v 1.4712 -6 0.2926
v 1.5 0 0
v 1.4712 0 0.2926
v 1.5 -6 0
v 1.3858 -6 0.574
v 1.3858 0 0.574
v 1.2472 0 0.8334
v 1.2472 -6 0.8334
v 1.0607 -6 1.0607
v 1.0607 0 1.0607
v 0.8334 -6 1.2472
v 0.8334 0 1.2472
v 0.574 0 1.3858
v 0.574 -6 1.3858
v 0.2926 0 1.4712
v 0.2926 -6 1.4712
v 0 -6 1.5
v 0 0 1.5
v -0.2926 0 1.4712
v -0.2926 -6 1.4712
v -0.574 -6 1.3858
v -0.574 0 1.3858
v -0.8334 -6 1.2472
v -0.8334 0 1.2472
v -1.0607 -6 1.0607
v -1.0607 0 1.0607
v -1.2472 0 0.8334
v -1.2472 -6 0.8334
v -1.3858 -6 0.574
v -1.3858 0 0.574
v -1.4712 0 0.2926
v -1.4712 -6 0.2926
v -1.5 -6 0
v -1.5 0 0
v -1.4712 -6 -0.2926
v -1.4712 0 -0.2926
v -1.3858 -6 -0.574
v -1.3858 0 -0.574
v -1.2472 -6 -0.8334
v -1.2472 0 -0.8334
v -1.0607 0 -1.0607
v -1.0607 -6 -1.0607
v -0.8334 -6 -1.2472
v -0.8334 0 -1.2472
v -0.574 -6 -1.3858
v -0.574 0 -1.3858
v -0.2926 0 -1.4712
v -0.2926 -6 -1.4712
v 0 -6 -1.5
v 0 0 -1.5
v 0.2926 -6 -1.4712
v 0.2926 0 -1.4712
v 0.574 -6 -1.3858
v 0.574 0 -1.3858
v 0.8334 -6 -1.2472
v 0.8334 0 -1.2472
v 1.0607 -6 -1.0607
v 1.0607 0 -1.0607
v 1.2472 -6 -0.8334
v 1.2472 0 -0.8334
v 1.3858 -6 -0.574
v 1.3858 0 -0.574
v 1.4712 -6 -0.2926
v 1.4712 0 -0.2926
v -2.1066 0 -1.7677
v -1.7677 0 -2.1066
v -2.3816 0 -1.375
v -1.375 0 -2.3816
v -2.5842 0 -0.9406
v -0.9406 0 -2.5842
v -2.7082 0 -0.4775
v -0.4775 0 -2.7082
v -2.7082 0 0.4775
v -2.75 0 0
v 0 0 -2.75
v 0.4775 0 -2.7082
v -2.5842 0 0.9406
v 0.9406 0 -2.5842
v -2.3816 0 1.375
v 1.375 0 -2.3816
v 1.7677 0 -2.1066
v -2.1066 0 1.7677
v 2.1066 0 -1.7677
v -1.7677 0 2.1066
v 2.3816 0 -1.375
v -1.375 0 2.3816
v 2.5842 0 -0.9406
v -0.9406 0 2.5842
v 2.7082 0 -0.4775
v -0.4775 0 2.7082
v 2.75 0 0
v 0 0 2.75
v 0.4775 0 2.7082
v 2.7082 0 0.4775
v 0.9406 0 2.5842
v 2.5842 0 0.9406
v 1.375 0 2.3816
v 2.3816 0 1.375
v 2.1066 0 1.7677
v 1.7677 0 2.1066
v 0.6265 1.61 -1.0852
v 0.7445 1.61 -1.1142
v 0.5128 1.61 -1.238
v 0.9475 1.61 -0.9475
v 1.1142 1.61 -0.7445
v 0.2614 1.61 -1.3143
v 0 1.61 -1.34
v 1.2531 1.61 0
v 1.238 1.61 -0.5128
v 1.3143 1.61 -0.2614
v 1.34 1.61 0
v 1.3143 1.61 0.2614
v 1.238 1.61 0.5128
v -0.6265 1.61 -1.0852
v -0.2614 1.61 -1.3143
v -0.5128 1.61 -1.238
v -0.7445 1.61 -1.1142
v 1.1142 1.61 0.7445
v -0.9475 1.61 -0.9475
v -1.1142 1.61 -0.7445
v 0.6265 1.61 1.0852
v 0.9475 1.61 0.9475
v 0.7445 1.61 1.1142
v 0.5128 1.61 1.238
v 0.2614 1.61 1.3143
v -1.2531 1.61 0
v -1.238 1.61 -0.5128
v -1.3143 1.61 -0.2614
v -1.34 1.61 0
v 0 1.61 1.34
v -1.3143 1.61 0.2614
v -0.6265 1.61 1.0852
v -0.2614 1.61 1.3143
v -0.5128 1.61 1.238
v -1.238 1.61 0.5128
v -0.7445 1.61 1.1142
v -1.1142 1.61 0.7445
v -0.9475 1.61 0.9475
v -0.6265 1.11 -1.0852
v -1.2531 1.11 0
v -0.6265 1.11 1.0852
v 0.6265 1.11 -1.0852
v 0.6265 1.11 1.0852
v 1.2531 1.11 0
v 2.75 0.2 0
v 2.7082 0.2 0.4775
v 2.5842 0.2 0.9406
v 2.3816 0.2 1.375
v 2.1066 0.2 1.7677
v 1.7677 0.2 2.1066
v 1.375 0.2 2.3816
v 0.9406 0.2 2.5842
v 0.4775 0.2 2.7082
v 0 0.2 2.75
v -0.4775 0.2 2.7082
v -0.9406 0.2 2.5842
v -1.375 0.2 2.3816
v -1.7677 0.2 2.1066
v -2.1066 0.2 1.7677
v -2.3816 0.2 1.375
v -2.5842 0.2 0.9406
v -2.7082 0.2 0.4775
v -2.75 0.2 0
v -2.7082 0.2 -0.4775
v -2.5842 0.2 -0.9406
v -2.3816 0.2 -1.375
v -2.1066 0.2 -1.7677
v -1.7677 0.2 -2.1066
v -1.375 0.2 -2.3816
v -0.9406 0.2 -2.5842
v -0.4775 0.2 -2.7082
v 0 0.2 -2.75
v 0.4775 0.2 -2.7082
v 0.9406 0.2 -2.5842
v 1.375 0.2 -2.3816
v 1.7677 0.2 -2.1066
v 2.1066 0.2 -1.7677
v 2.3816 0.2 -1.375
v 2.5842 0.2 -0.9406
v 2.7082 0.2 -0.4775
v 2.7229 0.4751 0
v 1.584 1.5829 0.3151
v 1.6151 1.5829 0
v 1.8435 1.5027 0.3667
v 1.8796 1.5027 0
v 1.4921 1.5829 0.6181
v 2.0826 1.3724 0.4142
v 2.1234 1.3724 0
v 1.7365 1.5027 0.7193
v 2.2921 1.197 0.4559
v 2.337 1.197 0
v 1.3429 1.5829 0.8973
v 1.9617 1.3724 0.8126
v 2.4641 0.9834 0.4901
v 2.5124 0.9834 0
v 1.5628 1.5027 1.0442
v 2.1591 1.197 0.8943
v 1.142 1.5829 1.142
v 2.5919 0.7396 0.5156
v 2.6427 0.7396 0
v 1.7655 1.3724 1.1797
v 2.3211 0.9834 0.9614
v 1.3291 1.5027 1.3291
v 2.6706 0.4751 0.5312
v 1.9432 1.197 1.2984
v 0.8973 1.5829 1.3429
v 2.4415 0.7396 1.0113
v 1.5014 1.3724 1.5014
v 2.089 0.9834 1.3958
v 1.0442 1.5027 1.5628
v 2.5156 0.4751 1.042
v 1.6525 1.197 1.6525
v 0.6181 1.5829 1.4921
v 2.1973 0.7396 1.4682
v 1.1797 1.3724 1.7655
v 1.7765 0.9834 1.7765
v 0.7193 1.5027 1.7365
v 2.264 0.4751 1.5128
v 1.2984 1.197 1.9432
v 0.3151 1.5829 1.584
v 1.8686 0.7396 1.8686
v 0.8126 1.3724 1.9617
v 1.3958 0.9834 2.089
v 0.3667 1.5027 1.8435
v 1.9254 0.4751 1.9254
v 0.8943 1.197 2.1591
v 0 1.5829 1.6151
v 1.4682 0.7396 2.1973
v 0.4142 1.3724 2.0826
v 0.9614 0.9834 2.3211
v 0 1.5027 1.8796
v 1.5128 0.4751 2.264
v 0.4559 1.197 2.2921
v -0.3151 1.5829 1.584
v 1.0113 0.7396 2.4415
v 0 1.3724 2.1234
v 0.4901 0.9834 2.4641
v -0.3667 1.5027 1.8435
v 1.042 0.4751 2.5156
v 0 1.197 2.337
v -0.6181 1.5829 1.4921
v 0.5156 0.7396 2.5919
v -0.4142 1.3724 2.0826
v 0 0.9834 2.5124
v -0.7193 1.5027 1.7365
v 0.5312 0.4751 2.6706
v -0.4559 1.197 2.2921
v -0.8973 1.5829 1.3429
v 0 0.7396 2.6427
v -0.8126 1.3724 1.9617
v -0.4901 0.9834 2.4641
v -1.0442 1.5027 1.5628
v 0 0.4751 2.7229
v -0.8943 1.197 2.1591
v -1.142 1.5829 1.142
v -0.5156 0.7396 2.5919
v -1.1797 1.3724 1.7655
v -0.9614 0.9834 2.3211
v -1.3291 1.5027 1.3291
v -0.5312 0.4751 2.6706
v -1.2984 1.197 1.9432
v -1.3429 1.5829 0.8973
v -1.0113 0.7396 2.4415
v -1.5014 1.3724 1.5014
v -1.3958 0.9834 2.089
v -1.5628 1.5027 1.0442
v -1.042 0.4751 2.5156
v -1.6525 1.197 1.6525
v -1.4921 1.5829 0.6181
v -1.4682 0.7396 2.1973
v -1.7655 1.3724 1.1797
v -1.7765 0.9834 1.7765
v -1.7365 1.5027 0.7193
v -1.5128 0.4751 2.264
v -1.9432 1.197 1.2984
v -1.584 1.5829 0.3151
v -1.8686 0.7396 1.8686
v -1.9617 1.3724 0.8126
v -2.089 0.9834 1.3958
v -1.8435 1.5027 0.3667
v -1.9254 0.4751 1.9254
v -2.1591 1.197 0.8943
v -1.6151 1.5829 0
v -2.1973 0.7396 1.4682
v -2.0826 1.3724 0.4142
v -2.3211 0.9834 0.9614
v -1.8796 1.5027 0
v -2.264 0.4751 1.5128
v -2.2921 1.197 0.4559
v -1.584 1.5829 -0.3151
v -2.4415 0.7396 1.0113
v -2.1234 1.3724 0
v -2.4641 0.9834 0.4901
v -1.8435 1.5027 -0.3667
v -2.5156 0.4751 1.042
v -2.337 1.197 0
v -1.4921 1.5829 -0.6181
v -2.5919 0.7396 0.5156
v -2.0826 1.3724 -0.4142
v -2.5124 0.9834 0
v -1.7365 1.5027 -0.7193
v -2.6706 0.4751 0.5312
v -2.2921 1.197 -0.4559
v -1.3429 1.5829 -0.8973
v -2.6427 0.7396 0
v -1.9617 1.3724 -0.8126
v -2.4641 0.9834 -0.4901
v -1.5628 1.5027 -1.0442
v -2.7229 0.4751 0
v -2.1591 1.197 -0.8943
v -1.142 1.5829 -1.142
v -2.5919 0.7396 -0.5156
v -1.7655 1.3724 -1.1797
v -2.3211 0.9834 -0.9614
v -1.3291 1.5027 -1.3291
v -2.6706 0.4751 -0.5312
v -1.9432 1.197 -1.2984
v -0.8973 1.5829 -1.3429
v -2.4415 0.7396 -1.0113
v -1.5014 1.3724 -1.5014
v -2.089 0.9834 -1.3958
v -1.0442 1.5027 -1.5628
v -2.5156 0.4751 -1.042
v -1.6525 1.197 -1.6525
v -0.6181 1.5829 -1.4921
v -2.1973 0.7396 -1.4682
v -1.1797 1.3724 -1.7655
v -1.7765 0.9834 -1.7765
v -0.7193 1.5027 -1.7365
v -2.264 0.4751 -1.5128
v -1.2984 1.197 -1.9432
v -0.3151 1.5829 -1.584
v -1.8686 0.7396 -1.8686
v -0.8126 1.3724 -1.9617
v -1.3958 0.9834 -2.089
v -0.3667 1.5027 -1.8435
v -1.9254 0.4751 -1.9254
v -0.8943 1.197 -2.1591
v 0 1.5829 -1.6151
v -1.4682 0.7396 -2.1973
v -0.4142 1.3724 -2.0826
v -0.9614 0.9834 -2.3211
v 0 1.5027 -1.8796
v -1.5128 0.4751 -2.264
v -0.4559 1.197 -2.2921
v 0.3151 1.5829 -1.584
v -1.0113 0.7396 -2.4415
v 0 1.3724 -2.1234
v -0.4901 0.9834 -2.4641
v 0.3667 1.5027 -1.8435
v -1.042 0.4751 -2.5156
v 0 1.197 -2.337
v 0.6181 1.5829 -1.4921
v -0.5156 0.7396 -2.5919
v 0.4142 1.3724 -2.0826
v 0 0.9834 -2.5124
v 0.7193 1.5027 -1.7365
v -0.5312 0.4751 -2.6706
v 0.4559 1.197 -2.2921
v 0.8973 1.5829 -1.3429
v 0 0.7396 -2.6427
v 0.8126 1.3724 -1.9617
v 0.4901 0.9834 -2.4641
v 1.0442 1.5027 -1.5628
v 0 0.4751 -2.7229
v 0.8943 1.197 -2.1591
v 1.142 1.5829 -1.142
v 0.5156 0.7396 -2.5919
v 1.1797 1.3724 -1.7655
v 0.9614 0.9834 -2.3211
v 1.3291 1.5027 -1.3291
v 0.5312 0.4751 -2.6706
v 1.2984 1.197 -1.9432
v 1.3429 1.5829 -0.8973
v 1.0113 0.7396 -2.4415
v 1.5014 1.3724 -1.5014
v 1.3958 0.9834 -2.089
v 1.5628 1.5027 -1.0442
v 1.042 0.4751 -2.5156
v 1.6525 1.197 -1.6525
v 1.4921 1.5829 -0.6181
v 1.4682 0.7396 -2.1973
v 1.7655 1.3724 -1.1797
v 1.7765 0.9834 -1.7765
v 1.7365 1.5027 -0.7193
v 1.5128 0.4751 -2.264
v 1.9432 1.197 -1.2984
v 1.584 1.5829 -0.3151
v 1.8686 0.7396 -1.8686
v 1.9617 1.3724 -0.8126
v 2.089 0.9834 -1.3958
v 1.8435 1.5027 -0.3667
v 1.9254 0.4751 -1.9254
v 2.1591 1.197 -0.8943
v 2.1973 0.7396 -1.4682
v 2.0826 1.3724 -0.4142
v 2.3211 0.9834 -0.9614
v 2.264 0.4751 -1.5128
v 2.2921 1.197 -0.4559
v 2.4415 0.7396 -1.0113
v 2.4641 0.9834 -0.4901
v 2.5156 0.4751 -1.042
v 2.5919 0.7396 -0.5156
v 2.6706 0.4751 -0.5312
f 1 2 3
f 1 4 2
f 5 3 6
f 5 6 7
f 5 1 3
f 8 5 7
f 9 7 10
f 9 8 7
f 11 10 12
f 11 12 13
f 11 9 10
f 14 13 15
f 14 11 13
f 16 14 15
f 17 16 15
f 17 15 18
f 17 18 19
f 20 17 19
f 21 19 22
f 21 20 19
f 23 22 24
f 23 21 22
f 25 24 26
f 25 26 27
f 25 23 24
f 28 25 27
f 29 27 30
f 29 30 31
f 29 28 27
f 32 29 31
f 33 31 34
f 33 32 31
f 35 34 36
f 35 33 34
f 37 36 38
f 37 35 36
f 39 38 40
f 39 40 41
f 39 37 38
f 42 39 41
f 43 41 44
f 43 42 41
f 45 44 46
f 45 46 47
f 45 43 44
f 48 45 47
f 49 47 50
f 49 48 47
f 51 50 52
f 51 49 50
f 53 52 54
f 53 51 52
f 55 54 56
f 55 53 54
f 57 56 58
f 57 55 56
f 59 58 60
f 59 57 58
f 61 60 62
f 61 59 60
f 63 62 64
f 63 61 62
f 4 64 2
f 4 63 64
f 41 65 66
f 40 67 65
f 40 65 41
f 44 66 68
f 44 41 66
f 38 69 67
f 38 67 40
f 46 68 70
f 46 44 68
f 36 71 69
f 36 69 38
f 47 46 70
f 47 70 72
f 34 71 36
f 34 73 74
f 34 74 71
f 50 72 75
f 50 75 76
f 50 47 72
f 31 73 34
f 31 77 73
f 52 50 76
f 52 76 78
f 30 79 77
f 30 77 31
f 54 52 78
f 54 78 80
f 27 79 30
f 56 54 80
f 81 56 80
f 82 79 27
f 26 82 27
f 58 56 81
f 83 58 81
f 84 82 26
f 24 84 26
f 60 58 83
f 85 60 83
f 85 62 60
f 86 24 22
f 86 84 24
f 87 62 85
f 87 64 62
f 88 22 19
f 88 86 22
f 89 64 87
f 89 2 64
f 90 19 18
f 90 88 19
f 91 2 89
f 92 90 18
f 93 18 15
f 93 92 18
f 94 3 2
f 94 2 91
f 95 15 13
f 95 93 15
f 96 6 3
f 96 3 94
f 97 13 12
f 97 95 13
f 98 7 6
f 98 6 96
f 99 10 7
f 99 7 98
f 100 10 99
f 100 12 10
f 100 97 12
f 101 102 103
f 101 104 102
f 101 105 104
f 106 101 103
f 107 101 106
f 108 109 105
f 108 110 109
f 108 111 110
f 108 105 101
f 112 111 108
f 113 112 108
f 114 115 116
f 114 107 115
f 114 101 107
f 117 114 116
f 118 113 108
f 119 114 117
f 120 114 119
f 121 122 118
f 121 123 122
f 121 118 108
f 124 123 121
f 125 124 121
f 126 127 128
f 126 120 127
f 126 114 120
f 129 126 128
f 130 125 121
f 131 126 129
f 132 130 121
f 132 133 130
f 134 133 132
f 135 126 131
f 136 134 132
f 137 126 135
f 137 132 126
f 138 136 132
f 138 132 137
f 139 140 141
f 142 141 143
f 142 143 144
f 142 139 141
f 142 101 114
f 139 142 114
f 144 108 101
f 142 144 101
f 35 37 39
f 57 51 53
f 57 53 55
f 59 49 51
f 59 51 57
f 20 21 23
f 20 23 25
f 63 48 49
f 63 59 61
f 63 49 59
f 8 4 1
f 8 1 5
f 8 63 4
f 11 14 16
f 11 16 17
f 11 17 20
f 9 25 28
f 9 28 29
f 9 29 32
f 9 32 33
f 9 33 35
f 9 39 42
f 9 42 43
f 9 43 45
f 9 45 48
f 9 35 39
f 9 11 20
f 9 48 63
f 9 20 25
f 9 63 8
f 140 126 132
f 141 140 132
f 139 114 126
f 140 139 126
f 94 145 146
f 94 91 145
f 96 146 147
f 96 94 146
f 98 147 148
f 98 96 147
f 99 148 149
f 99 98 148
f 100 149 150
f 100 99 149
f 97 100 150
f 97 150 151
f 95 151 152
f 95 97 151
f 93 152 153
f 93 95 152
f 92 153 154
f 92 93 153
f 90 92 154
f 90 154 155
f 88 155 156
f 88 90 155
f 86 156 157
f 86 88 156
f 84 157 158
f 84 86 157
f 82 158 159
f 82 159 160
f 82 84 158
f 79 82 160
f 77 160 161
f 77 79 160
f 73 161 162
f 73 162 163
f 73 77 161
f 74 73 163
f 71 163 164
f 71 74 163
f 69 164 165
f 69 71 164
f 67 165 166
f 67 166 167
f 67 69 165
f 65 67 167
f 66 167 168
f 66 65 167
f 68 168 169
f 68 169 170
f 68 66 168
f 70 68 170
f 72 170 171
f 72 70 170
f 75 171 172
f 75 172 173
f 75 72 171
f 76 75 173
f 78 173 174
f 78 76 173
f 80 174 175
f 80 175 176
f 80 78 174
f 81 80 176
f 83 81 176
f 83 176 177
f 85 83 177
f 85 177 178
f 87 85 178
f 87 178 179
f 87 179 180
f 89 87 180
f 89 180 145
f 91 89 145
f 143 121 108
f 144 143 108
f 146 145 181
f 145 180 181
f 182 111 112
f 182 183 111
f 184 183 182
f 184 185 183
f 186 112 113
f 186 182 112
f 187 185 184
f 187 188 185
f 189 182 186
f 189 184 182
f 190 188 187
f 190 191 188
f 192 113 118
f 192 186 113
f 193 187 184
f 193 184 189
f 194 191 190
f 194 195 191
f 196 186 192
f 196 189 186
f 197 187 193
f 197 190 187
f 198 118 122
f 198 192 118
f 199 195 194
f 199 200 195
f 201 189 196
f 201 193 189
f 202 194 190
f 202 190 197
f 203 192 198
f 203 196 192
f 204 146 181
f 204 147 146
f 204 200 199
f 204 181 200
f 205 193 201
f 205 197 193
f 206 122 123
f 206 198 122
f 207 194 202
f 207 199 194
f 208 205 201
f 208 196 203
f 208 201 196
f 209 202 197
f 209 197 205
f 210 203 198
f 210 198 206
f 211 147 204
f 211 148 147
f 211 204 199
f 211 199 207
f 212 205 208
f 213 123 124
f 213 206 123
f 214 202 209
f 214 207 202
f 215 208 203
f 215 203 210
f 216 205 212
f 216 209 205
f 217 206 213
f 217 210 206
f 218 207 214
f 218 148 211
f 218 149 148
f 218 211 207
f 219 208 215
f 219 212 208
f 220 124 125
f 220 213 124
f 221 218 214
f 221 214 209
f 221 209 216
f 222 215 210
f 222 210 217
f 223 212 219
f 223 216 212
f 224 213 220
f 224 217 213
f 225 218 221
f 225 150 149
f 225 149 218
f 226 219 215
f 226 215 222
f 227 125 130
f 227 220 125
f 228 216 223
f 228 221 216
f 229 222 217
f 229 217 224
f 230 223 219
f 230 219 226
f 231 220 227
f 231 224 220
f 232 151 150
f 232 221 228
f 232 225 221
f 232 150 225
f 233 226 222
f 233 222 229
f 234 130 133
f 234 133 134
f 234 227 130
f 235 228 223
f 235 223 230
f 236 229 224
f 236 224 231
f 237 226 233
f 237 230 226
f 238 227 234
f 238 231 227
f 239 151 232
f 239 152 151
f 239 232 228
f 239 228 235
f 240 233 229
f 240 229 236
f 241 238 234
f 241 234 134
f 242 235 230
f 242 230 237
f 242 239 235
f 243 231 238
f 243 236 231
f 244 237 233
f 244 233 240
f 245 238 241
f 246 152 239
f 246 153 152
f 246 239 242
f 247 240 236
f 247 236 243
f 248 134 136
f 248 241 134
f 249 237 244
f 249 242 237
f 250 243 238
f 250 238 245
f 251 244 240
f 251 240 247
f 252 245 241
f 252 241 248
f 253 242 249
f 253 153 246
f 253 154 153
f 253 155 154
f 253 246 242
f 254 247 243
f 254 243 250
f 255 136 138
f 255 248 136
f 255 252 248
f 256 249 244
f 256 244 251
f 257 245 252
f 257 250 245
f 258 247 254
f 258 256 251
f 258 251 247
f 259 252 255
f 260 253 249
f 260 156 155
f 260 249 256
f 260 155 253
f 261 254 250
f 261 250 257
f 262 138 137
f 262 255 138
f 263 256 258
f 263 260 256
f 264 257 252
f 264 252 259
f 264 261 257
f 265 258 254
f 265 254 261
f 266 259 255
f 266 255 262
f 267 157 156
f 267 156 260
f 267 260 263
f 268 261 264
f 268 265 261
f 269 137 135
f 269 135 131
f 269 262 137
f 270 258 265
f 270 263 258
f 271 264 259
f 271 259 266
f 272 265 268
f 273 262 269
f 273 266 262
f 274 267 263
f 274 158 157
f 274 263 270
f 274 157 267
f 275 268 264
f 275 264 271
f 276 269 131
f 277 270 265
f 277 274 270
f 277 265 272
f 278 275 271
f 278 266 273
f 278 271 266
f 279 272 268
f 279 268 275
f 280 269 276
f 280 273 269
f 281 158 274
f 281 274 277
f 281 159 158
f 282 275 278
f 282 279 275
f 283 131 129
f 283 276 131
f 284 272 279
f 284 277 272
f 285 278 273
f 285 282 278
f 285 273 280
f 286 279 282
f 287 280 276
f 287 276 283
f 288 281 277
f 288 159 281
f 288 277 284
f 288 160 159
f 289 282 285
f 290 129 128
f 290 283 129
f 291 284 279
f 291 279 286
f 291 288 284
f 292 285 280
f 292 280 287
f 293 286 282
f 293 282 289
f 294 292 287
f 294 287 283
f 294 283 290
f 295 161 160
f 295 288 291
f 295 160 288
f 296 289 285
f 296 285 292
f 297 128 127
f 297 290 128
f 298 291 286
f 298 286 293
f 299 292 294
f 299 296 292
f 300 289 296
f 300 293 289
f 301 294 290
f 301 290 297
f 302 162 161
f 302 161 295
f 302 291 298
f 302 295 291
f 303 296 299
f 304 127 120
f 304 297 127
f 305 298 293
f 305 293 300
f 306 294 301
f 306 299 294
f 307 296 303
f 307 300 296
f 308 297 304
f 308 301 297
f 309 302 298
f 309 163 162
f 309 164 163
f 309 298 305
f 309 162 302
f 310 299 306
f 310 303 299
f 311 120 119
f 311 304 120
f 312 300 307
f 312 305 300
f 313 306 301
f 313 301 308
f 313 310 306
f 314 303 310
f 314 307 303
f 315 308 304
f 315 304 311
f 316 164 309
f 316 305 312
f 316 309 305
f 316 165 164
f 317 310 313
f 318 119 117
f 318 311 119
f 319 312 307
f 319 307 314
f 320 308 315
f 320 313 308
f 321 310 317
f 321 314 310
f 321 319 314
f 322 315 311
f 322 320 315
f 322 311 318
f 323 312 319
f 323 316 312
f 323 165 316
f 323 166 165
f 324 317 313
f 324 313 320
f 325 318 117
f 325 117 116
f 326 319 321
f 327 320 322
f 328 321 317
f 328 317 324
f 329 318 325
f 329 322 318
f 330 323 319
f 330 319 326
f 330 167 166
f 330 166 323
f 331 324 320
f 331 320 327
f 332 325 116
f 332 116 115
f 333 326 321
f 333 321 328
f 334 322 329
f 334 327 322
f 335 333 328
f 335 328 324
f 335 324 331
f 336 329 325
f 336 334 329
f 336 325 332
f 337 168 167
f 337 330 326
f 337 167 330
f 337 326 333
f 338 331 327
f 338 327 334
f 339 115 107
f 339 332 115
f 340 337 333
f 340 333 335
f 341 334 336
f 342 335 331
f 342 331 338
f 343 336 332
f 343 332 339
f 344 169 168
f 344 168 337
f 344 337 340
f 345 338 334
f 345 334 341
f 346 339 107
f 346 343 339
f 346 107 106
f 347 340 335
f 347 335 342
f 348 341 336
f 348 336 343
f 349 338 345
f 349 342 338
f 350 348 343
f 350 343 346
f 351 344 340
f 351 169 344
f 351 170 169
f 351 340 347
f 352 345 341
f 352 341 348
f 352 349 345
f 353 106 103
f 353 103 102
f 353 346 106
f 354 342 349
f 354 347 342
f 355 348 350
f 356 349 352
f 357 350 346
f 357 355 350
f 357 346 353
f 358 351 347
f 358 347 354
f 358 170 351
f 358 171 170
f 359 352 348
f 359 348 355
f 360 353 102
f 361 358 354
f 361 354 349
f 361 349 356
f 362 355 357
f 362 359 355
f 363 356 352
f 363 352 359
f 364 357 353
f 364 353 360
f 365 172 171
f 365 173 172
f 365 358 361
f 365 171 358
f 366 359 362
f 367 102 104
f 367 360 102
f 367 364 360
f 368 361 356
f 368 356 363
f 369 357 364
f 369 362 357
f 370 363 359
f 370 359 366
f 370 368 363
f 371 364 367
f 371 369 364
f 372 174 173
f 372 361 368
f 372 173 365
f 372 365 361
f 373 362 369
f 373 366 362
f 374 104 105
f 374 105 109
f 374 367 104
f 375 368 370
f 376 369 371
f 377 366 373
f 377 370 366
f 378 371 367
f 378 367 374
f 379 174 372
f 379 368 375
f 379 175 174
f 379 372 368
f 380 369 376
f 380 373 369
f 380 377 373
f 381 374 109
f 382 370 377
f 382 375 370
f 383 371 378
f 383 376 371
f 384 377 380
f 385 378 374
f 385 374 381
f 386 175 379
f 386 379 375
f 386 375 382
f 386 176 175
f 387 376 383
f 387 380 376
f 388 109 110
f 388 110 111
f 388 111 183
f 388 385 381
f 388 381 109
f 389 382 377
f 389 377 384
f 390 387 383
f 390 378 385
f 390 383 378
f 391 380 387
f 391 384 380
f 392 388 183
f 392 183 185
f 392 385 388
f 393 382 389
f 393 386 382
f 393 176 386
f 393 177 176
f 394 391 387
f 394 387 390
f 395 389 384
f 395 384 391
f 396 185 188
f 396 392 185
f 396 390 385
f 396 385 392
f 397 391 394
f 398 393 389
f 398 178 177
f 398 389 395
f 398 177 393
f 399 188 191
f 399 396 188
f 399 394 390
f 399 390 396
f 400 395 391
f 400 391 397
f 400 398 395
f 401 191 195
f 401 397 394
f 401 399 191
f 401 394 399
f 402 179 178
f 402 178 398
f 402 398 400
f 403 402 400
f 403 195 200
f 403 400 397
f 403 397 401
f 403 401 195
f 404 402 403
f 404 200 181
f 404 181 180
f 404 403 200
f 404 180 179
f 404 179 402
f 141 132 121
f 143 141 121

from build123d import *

# Parameters (mm, degrees)
CUT_EXTRUDE1_DEPTH = 0.5


with BuildPart() as part:
    # Sketch1 → Revolve1 (revolve)
    with BuildSketch(Plane.XY):
        with BuildLine():
            Line((0, 1.61), (1.34, 1.61))
            ThreePointArc((1.34, 1.61), (2.337020561, 1.197020561), (2.75, 0.2))
            Line((2.75, 0.2), (2.75, 0))
            Line((2.75, 0), (1.5, 0))
            Line((1.5, 0), (1.5, -6))
            Line((1.5, -6), (0, -6))
            Line((0, -6), (0, 1.61))
        make_face()
    revolve(axis=Axis((0, 9.083769969, 0), (0, -1, 0)))

    # Sketch2 → Cut-Extrude1 (cut)
    with BuildSketch(Plane(origin=(0, 1.61, 0), x_dir=(1, 0, 0), z_dir=(0, 1, 0))):
        Polygon((0.62654248, 1.085203409), (-0.62654248, 1.085203409), (-1.253084961, 0), (-0.62654248, -1.085203409), (0.62654248, -1.085203409), (1.253084961, 0), align=None)
    extrude(amount=-CUT_EXTRUDE1_DEPTH, mode=Mode.SUBTRACT)


solid = part.part
